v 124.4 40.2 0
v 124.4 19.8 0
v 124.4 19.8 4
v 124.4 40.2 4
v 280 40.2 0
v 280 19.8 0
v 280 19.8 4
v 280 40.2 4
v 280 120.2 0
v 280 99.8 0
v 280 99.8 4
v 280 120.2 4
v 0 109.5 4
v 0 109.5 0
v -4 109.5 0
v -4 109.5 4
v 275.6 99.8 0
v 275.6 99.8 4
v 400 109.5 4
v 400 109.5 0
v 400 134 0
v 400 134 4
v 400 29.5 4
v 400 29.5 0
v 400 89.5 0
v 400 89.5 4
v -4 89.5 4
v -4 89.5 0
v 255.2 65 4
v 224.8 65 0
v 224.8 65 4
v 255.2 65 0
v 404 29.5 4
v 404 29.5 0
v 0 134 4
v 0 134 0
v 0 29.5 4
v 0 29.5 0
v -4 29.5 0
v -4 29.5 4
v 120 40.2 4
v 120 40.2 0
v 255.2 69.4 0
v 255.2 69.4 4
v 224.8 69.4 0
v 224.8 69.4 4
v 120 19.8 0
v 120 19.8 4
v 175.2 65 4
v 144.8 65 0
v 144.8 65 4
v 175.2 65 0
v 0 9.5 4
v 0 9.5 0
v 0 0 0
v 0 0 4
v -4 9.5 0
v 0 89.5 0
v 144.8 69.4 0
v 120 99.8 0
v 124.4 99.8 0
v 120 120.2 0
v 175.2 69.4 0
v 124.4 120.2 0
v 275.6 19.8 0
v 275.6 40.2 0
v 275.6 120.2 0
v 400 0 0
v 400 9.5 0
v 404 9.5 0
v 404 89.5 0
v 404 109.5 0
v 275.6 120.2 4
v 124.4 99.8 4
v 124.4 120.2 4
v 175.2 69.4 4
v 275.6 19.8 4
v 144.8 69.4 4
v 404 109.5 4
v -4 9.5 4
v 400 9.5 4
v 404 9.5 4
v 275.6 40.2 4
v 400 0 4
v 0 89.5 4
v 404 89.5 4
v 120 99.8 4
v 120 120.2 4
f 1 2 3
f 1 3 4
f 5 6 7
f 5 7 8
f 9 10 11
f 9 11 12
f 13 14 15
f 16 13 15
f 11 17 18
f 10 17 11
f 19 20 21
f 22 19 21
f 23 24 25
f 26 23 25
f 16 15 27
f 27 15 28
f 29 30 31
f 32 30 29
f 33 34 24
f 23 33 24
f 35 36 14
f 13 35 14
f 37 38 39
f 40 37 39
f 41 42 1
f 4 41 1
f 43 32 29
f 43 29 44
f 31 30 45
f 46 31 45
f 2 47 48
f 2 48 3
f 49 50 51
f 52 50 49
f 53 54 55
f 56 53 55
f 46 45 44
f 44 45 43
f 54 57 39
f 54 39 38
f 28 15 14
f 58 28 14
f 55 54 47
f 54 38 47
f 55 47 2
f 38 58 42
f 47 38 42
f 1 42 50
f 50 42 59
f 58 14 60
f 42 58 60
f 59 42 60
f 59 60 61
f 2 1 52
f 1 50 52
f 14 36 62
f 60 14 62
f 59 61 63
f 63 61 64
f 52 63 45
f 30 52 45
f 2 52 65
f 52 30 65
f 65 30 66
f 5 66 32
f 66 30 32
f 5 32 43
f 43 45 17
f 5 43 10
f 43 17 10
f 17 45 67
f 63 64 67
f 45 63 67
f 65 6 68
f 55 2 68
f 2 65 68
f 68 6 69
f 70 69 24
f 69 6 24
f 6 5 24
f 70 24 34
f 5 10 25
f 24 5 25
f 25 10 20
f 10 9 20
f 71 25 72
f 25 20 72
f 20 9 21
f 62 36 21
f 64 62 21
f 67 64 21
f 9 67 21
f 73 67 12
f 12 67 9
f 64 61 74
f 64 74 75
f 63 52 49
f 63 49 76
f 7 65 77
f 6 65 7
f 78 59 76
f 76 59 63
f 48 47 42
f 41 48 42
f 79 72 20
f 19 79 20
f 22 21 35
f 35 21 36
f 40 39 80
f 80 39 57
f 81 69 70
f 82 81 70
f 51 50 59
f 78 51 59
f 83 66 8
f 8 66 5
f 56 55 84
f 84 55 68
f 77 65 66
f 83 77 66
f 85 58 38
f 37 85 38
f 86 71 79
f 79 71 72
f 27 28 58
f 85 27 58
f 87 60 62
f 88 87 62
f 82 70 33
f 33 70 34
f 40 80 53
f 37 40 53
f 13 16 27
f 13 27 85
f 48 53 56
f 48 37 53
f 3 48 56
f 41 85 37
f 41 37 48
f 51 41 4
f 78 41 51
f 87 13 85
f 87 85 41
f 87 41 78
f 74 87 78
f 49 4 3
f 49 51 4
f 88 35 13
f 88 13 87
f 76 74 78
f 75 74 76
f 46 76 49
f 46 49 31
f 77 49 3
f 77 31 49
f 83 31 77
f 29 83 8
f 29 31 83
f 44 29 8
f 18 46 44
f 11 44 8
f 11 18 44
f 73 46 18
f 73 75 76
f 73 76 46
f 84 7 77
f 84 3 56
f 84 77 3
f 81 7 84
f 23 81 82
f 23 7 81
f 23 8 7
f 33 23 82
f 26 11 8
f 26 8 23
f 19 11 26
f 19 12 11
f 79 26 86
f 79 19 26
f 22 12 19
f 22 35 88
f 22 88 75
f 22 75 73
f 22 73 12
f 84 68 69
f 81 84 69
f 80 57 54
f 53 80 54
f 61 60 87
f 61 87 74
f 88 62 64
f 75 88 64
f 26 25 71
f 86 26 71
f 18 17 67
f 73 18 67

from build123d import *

# Parameters (mm, degrees)
SKETCH_1_W      = 4.4
SKETCH_1_H      = 20.4
SKETCH_1_W_2    = 30.4
SKETCH_1_H_2    = 4.4
EXTRUDE_1_DEPTH = 4


with BuildPart() as part:
    # Эскиз1 → Бобышка-Вытянуть1 (new body)
    with BuildSketch(Plane.XY):
        Polygon((0, 9.5), (0, 0), (400, 0), (400, 9.5), (404, 9.5), (404, 29.5), (400, 29.5), (400, 89.5), (404, 89.5), (404, 109.5), (400, 109.5), (400, 134), (0, 134), (0, 109.5), (-4, 109.5), (-4, 89.5), (0, 89.5), (0, 29.5), (-4, 29.5), (-4, 9.5), align=None)
        with Locations((122.2, 30)):
            Rectangle(SKETCH_1_W, SKETCH_1_H, mode=Mode.SUBTRACT)
        with Locations((277.8, 30)):
            Rectangle(SKETCH_1_W, SKETCH_1_H, mode=Mode.SUBTRACT)
        with Locations((160, 67.2)):
            Rectangle(SKETCH_1_W_2, SKETCH_1_H_2, mode=Mode.SUBTRACT)
        with Locations((122.2, 110)):
            Rectangle(SKETCH_1_W, SKETCH_1_H, mode=Mode.SUBTRACT)
        with Locations((240, 67.2)):
            Rectangle(SKETCH_1_W_2, SKETCH_1_H_2, mode=Mode.SUBTRACT)
        with Locations((277.8, 110)):
            Rectangle(SKETCH_1_W, SKETCH_1_H, mode=Mode.SUBTRACT)
    extrude(amount=EXTRUDE_1_DEPTH)


solid = part.part
